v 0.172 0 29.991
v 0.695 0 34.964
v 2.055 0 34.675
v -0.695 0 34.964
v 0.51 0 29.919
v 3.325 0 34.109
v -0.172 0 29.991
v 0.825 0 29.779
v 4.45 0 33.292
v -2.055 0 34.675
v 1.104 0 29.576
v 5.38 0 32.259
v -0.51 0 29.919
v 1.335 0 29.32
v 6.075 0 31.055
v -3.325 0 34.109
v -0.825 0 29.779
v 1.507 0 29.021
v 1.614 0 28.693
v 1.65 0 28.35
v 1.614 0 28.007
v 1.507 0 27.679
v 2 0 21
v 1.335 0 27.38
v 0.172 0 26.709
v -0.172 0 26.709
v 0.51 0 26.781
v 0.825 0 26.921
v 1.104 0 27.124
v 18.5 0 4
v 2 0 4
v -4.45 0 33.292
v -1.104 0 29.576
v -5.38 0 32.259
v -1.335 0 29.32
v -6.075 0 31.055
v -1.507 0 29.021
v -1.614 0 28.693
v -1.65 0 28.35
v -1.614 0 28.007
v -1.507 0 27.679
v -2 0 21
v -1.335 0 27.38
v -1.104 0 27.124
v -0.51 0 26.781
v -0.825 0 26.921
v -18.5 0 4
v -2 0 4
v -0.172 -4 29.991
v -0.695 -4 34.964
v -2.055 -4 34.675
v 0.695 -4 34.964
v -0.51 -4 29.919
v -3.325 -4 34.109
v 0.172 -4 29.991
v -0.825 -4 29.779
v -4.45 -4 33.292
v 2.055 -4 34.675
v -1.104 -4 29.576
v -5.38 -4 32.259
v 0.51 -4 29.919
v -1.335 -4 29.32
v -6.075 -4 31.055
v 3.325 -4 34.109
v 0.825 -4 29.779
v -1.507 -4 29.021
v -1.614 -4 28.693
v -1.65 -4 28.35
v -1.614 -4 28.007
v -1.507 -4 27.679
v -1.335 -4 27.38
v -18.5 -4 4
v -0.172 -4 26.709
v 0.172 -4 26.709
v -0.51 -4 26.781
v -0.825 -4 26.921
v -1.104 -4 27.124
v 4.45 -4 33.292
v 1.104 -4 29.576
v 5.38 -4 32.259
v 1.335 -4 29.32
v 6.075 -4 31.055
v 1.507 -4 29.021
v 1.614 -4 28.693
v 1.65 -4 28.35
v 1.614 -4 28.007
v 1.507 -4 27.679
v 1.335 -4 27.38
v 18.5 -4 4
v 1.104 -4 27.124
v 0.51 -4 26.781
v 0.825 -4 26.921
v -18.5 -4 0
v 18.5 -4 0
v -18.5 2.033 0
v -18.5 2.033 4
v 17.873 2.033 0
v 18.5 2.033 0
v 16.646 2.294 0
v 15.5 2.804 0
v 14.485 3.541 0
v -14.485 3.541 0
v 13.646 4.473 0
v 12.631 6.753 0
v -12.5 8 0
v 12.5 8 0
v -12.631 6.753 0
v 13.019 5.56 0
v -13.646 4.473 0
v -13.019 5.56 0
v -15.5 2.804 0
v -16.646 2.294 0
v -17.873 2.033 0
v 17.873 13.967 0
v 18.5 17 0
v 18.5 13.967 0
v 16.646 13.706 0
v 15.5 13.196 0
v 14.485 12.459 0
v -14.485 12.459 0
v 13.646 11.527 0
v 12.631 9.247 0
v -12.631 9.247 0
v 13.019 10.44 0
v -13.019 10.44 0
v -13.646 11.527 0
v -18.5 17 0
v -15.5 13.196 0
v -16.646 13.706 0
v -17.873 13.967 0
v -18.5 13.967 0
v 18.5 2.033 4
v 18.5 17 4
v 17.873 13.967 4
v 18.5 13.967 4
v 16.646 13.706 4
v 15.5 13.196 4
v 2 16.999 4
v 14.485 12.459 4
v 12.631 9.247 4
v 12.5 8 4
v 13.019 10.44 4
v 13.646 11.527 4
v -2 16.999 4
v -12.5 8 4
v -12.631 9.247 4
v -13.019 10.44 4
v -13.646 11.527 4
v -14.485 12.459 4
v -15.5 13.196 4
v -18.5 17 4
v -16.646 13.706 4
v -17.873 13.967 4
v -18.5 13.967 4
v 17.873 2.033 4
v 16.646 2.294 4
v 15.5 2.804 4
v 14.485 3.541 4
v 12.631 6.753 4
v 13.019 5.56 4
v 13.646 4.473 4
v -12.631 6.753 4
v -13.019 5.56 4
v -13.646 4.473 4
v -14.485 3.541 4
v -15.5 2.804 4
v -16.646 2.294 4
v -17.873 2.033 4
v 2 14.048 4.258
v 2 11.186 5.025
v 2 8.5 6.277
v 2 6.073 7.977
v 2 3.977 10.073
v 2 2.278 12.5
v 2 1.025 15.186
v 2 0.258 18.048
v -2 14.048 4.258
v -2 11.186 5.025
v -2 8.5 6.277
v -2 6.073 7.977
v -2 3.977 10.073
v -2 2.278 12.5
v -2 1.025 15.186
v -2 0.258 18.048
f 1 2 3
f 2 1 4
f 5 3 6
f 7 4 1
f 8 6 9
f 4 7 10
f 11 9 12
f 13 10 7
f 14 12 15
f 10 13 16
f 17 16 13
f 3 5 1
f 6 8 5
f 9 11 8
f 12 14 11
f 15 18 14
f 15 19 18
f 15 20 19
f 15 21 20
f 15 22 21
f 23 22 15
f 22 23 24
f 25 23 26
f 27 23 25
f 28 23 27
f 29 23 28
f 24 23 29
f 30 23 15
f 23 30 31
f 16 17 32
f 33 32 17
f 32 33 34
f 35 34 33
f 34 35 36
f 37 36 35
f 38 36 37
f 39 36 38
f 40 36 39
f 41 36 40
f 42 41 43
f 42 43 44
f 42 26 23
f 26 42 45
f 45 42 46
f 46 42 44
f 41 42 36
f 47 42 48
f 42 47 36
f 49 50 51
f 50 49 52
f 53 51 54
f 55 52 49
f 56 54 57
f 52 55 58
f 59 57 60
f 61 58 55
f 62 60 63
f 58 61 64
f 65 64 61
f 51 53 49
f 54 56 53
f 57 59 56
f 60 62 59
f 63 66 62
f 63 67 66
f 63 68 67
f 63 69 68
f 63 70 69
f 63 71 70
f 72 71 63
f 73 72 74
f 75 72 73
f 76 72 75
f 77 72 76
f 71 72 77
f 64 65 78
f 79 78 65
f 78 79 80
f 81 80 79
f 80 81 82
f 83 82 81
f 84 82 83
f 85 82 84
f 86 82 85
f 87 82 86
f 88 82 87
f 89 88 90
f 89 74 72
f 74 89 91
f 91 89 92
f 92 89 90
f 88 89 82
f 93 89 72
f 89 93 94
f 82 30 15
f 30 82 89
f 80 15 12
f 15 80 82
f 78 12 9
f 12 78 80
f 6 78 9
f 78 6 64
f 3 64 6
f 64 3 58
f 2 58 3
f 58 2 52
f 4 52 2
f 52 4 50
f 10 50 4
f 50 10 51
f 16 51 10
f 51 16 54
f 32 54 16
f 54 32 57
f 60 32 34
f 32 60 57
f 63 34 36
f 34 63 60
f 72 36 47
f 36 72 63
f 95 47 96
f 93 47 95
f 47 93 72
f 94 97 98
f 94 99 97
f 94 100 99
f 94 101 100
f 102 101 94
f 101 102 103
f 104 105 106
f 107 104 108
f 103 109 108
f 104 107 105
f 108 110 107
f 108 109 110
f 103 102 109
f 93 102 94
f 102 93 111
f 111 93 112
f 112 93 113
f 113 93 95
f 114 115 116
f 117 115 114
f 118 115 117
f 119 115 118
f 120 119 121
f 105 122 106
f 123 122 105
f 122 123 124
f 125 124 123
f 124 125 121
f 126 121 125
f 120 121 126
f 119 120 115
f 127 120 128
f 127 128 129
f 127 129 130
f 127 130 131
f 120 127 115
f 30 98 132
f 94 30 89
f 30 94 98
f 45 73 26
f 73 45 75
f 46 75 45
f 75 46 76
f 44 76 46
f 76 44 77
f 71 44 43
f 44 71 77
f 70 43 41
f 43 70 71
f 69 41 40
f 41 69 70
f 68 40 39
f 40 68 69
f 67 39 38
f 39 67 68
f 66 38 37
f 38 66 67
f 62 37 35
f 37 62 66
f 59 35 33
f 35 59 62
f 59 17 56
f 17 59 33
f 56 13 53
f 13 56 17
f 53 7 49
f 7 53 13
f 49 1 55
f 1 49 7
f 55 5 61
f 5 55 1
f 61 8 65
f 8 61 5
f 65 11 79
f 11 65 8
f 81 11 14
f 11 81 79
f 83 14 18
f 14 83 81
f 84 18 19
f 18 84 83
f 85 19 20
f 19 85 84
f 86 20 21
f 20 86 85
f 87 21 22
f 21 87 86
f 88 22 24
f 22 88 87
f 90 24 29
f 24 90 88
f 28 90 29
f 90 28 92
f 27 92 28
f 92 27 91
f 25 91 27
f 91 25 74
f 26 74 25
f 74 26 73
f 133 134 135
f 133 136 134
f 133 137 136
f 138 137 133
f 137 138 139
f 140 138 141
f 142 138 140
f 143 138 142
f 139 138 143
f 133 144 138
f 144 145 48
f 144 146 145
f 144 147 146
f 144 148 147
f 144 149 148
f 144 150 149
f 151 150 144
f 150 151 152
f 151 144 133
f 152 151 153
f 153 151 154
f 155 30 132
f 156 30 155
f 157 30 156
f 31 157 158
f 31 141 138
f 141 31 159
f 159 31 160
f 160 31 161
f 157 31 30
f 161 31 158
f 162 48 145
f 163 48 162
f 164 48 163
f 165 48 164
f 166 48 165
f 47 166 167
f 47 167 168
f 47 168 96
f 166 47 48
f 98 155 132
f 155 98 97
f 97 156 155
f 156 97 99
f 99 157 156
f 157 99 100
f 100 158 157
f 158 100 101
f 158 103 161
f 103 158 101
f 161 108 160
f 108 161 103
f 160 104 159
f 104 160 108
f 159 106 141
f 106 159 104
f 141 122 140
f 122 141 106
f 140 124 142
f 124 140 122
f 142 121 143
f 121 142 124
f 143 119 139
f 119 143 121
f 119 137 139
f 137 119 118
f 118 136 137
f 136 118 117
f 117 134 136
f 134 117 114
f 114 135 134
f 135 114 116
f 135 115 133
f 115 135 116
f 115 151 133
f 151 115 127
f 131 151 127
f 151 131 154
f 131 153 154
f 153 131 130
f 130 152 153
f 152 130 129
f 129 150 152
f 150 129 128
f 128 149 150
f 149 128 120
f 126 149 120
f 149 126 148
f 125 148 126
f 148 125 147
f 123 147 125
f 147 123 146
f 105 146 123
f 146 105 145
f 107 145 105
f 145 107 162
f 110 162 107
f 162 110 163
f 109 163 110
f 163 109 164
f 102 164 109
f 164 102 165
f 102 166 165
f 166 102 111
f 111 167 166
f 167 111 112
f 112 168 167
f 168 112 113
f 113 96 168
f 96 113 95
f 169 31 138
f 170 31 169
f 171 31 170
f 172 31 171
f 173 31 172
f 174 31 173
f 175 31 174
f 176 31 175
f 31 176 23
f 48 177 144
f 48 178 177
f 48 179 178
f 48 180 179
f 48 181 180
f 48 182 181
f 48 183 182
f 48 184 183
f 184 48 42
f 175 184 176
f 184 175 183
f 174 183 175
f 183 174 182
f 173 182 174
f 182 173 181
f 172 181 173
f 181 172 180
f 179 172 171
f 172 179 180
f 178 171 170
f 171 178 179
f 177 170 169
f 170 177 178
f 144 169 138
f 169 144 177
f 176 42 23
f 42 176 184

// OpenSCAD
// Customizable Plier Holder
// preview[view:south]

// Thickness of hangar, base, and brace (if enabled).
plate_thickness = 4;

// Diameter of hole in hangar.
hole_diameter = 3.3;

// Size of border around hangar hole.
top_margin = 5;

// Size of border in front of handle hole.
front_margin = 3;

// Height from bottom of base to top of hangar.
total_height = 35;

// Handle hole diameter. Set slightly larger than actual tool handle diameter.
handle_diameter = 12;

// Distance between handle holes. Measured from inner edges.
handle_spacing = 25; 

// Distance between hangar and handle holes. Increase to permit more clearance between tool and hangar.
handle_clearance = 2;

// If enabled, include a brace between the hangar and the base.
reinforce = 1; // [0:Disabled, 1:Enabled]

/* [Hidden] */

hole_radius = hole_diameter / 2;
handle_radius = handle_diameter / 2;
base_width = handle_diameter + handle_spacing;
base_depth = handle_diameter + front_margin + handle_clearance;
hole_height = total_height - top_margin - hole_radius;
$fn = 30;


union() {
	Hangar();
	Base();
	if (reinforce == 1) {
		Brace();
	}
}

module Brace() {
	assign(
			size = min(hole_height - hole_radius - plate_thickness - top_margin,
			base_depth)) {
		// - 0.0001 is a stupid fudge to circumvent some coincident plane issue
		translate([plate_thickness / 2, 0, plate_thickness - 0.0001])
		rotate([0, -90, 0])
		linear_extrude(height=plate_thickness)
		difference() {
			square([size, size]);
			translate([size, size]) circle(r=size, $fn=36);
		}	
	}
}

module Hangar() {
	rotate([90, 0, 0])
	linear_extrude(height=plate_thickness)
	difference() {

		hull() {
			translate([0, hole_height, 0])
			circle(r=hole_radius + top_margin);
	
			translate([-base_width/2, 0, 0])
			square([base_width, plate_thickness]);
		}
	
		translate([0, hole_height, 0])
		circle(r=hole_radius);
	}
}

module Base() {
	linear_extrude(height=plate_thickness)
	difference() {	
		translate([-base_width/2, 0, 0])
		square([base_width, base_depth]);	

		translate([-base_width/2, handle_clearance + handle_radius, 0])
		circle(r=handle_diameter / 2);

		translate([base_width/2, handle_clearance + handle_radius, 0])
		circle(r=handle_diameter / 2);
	}
}
